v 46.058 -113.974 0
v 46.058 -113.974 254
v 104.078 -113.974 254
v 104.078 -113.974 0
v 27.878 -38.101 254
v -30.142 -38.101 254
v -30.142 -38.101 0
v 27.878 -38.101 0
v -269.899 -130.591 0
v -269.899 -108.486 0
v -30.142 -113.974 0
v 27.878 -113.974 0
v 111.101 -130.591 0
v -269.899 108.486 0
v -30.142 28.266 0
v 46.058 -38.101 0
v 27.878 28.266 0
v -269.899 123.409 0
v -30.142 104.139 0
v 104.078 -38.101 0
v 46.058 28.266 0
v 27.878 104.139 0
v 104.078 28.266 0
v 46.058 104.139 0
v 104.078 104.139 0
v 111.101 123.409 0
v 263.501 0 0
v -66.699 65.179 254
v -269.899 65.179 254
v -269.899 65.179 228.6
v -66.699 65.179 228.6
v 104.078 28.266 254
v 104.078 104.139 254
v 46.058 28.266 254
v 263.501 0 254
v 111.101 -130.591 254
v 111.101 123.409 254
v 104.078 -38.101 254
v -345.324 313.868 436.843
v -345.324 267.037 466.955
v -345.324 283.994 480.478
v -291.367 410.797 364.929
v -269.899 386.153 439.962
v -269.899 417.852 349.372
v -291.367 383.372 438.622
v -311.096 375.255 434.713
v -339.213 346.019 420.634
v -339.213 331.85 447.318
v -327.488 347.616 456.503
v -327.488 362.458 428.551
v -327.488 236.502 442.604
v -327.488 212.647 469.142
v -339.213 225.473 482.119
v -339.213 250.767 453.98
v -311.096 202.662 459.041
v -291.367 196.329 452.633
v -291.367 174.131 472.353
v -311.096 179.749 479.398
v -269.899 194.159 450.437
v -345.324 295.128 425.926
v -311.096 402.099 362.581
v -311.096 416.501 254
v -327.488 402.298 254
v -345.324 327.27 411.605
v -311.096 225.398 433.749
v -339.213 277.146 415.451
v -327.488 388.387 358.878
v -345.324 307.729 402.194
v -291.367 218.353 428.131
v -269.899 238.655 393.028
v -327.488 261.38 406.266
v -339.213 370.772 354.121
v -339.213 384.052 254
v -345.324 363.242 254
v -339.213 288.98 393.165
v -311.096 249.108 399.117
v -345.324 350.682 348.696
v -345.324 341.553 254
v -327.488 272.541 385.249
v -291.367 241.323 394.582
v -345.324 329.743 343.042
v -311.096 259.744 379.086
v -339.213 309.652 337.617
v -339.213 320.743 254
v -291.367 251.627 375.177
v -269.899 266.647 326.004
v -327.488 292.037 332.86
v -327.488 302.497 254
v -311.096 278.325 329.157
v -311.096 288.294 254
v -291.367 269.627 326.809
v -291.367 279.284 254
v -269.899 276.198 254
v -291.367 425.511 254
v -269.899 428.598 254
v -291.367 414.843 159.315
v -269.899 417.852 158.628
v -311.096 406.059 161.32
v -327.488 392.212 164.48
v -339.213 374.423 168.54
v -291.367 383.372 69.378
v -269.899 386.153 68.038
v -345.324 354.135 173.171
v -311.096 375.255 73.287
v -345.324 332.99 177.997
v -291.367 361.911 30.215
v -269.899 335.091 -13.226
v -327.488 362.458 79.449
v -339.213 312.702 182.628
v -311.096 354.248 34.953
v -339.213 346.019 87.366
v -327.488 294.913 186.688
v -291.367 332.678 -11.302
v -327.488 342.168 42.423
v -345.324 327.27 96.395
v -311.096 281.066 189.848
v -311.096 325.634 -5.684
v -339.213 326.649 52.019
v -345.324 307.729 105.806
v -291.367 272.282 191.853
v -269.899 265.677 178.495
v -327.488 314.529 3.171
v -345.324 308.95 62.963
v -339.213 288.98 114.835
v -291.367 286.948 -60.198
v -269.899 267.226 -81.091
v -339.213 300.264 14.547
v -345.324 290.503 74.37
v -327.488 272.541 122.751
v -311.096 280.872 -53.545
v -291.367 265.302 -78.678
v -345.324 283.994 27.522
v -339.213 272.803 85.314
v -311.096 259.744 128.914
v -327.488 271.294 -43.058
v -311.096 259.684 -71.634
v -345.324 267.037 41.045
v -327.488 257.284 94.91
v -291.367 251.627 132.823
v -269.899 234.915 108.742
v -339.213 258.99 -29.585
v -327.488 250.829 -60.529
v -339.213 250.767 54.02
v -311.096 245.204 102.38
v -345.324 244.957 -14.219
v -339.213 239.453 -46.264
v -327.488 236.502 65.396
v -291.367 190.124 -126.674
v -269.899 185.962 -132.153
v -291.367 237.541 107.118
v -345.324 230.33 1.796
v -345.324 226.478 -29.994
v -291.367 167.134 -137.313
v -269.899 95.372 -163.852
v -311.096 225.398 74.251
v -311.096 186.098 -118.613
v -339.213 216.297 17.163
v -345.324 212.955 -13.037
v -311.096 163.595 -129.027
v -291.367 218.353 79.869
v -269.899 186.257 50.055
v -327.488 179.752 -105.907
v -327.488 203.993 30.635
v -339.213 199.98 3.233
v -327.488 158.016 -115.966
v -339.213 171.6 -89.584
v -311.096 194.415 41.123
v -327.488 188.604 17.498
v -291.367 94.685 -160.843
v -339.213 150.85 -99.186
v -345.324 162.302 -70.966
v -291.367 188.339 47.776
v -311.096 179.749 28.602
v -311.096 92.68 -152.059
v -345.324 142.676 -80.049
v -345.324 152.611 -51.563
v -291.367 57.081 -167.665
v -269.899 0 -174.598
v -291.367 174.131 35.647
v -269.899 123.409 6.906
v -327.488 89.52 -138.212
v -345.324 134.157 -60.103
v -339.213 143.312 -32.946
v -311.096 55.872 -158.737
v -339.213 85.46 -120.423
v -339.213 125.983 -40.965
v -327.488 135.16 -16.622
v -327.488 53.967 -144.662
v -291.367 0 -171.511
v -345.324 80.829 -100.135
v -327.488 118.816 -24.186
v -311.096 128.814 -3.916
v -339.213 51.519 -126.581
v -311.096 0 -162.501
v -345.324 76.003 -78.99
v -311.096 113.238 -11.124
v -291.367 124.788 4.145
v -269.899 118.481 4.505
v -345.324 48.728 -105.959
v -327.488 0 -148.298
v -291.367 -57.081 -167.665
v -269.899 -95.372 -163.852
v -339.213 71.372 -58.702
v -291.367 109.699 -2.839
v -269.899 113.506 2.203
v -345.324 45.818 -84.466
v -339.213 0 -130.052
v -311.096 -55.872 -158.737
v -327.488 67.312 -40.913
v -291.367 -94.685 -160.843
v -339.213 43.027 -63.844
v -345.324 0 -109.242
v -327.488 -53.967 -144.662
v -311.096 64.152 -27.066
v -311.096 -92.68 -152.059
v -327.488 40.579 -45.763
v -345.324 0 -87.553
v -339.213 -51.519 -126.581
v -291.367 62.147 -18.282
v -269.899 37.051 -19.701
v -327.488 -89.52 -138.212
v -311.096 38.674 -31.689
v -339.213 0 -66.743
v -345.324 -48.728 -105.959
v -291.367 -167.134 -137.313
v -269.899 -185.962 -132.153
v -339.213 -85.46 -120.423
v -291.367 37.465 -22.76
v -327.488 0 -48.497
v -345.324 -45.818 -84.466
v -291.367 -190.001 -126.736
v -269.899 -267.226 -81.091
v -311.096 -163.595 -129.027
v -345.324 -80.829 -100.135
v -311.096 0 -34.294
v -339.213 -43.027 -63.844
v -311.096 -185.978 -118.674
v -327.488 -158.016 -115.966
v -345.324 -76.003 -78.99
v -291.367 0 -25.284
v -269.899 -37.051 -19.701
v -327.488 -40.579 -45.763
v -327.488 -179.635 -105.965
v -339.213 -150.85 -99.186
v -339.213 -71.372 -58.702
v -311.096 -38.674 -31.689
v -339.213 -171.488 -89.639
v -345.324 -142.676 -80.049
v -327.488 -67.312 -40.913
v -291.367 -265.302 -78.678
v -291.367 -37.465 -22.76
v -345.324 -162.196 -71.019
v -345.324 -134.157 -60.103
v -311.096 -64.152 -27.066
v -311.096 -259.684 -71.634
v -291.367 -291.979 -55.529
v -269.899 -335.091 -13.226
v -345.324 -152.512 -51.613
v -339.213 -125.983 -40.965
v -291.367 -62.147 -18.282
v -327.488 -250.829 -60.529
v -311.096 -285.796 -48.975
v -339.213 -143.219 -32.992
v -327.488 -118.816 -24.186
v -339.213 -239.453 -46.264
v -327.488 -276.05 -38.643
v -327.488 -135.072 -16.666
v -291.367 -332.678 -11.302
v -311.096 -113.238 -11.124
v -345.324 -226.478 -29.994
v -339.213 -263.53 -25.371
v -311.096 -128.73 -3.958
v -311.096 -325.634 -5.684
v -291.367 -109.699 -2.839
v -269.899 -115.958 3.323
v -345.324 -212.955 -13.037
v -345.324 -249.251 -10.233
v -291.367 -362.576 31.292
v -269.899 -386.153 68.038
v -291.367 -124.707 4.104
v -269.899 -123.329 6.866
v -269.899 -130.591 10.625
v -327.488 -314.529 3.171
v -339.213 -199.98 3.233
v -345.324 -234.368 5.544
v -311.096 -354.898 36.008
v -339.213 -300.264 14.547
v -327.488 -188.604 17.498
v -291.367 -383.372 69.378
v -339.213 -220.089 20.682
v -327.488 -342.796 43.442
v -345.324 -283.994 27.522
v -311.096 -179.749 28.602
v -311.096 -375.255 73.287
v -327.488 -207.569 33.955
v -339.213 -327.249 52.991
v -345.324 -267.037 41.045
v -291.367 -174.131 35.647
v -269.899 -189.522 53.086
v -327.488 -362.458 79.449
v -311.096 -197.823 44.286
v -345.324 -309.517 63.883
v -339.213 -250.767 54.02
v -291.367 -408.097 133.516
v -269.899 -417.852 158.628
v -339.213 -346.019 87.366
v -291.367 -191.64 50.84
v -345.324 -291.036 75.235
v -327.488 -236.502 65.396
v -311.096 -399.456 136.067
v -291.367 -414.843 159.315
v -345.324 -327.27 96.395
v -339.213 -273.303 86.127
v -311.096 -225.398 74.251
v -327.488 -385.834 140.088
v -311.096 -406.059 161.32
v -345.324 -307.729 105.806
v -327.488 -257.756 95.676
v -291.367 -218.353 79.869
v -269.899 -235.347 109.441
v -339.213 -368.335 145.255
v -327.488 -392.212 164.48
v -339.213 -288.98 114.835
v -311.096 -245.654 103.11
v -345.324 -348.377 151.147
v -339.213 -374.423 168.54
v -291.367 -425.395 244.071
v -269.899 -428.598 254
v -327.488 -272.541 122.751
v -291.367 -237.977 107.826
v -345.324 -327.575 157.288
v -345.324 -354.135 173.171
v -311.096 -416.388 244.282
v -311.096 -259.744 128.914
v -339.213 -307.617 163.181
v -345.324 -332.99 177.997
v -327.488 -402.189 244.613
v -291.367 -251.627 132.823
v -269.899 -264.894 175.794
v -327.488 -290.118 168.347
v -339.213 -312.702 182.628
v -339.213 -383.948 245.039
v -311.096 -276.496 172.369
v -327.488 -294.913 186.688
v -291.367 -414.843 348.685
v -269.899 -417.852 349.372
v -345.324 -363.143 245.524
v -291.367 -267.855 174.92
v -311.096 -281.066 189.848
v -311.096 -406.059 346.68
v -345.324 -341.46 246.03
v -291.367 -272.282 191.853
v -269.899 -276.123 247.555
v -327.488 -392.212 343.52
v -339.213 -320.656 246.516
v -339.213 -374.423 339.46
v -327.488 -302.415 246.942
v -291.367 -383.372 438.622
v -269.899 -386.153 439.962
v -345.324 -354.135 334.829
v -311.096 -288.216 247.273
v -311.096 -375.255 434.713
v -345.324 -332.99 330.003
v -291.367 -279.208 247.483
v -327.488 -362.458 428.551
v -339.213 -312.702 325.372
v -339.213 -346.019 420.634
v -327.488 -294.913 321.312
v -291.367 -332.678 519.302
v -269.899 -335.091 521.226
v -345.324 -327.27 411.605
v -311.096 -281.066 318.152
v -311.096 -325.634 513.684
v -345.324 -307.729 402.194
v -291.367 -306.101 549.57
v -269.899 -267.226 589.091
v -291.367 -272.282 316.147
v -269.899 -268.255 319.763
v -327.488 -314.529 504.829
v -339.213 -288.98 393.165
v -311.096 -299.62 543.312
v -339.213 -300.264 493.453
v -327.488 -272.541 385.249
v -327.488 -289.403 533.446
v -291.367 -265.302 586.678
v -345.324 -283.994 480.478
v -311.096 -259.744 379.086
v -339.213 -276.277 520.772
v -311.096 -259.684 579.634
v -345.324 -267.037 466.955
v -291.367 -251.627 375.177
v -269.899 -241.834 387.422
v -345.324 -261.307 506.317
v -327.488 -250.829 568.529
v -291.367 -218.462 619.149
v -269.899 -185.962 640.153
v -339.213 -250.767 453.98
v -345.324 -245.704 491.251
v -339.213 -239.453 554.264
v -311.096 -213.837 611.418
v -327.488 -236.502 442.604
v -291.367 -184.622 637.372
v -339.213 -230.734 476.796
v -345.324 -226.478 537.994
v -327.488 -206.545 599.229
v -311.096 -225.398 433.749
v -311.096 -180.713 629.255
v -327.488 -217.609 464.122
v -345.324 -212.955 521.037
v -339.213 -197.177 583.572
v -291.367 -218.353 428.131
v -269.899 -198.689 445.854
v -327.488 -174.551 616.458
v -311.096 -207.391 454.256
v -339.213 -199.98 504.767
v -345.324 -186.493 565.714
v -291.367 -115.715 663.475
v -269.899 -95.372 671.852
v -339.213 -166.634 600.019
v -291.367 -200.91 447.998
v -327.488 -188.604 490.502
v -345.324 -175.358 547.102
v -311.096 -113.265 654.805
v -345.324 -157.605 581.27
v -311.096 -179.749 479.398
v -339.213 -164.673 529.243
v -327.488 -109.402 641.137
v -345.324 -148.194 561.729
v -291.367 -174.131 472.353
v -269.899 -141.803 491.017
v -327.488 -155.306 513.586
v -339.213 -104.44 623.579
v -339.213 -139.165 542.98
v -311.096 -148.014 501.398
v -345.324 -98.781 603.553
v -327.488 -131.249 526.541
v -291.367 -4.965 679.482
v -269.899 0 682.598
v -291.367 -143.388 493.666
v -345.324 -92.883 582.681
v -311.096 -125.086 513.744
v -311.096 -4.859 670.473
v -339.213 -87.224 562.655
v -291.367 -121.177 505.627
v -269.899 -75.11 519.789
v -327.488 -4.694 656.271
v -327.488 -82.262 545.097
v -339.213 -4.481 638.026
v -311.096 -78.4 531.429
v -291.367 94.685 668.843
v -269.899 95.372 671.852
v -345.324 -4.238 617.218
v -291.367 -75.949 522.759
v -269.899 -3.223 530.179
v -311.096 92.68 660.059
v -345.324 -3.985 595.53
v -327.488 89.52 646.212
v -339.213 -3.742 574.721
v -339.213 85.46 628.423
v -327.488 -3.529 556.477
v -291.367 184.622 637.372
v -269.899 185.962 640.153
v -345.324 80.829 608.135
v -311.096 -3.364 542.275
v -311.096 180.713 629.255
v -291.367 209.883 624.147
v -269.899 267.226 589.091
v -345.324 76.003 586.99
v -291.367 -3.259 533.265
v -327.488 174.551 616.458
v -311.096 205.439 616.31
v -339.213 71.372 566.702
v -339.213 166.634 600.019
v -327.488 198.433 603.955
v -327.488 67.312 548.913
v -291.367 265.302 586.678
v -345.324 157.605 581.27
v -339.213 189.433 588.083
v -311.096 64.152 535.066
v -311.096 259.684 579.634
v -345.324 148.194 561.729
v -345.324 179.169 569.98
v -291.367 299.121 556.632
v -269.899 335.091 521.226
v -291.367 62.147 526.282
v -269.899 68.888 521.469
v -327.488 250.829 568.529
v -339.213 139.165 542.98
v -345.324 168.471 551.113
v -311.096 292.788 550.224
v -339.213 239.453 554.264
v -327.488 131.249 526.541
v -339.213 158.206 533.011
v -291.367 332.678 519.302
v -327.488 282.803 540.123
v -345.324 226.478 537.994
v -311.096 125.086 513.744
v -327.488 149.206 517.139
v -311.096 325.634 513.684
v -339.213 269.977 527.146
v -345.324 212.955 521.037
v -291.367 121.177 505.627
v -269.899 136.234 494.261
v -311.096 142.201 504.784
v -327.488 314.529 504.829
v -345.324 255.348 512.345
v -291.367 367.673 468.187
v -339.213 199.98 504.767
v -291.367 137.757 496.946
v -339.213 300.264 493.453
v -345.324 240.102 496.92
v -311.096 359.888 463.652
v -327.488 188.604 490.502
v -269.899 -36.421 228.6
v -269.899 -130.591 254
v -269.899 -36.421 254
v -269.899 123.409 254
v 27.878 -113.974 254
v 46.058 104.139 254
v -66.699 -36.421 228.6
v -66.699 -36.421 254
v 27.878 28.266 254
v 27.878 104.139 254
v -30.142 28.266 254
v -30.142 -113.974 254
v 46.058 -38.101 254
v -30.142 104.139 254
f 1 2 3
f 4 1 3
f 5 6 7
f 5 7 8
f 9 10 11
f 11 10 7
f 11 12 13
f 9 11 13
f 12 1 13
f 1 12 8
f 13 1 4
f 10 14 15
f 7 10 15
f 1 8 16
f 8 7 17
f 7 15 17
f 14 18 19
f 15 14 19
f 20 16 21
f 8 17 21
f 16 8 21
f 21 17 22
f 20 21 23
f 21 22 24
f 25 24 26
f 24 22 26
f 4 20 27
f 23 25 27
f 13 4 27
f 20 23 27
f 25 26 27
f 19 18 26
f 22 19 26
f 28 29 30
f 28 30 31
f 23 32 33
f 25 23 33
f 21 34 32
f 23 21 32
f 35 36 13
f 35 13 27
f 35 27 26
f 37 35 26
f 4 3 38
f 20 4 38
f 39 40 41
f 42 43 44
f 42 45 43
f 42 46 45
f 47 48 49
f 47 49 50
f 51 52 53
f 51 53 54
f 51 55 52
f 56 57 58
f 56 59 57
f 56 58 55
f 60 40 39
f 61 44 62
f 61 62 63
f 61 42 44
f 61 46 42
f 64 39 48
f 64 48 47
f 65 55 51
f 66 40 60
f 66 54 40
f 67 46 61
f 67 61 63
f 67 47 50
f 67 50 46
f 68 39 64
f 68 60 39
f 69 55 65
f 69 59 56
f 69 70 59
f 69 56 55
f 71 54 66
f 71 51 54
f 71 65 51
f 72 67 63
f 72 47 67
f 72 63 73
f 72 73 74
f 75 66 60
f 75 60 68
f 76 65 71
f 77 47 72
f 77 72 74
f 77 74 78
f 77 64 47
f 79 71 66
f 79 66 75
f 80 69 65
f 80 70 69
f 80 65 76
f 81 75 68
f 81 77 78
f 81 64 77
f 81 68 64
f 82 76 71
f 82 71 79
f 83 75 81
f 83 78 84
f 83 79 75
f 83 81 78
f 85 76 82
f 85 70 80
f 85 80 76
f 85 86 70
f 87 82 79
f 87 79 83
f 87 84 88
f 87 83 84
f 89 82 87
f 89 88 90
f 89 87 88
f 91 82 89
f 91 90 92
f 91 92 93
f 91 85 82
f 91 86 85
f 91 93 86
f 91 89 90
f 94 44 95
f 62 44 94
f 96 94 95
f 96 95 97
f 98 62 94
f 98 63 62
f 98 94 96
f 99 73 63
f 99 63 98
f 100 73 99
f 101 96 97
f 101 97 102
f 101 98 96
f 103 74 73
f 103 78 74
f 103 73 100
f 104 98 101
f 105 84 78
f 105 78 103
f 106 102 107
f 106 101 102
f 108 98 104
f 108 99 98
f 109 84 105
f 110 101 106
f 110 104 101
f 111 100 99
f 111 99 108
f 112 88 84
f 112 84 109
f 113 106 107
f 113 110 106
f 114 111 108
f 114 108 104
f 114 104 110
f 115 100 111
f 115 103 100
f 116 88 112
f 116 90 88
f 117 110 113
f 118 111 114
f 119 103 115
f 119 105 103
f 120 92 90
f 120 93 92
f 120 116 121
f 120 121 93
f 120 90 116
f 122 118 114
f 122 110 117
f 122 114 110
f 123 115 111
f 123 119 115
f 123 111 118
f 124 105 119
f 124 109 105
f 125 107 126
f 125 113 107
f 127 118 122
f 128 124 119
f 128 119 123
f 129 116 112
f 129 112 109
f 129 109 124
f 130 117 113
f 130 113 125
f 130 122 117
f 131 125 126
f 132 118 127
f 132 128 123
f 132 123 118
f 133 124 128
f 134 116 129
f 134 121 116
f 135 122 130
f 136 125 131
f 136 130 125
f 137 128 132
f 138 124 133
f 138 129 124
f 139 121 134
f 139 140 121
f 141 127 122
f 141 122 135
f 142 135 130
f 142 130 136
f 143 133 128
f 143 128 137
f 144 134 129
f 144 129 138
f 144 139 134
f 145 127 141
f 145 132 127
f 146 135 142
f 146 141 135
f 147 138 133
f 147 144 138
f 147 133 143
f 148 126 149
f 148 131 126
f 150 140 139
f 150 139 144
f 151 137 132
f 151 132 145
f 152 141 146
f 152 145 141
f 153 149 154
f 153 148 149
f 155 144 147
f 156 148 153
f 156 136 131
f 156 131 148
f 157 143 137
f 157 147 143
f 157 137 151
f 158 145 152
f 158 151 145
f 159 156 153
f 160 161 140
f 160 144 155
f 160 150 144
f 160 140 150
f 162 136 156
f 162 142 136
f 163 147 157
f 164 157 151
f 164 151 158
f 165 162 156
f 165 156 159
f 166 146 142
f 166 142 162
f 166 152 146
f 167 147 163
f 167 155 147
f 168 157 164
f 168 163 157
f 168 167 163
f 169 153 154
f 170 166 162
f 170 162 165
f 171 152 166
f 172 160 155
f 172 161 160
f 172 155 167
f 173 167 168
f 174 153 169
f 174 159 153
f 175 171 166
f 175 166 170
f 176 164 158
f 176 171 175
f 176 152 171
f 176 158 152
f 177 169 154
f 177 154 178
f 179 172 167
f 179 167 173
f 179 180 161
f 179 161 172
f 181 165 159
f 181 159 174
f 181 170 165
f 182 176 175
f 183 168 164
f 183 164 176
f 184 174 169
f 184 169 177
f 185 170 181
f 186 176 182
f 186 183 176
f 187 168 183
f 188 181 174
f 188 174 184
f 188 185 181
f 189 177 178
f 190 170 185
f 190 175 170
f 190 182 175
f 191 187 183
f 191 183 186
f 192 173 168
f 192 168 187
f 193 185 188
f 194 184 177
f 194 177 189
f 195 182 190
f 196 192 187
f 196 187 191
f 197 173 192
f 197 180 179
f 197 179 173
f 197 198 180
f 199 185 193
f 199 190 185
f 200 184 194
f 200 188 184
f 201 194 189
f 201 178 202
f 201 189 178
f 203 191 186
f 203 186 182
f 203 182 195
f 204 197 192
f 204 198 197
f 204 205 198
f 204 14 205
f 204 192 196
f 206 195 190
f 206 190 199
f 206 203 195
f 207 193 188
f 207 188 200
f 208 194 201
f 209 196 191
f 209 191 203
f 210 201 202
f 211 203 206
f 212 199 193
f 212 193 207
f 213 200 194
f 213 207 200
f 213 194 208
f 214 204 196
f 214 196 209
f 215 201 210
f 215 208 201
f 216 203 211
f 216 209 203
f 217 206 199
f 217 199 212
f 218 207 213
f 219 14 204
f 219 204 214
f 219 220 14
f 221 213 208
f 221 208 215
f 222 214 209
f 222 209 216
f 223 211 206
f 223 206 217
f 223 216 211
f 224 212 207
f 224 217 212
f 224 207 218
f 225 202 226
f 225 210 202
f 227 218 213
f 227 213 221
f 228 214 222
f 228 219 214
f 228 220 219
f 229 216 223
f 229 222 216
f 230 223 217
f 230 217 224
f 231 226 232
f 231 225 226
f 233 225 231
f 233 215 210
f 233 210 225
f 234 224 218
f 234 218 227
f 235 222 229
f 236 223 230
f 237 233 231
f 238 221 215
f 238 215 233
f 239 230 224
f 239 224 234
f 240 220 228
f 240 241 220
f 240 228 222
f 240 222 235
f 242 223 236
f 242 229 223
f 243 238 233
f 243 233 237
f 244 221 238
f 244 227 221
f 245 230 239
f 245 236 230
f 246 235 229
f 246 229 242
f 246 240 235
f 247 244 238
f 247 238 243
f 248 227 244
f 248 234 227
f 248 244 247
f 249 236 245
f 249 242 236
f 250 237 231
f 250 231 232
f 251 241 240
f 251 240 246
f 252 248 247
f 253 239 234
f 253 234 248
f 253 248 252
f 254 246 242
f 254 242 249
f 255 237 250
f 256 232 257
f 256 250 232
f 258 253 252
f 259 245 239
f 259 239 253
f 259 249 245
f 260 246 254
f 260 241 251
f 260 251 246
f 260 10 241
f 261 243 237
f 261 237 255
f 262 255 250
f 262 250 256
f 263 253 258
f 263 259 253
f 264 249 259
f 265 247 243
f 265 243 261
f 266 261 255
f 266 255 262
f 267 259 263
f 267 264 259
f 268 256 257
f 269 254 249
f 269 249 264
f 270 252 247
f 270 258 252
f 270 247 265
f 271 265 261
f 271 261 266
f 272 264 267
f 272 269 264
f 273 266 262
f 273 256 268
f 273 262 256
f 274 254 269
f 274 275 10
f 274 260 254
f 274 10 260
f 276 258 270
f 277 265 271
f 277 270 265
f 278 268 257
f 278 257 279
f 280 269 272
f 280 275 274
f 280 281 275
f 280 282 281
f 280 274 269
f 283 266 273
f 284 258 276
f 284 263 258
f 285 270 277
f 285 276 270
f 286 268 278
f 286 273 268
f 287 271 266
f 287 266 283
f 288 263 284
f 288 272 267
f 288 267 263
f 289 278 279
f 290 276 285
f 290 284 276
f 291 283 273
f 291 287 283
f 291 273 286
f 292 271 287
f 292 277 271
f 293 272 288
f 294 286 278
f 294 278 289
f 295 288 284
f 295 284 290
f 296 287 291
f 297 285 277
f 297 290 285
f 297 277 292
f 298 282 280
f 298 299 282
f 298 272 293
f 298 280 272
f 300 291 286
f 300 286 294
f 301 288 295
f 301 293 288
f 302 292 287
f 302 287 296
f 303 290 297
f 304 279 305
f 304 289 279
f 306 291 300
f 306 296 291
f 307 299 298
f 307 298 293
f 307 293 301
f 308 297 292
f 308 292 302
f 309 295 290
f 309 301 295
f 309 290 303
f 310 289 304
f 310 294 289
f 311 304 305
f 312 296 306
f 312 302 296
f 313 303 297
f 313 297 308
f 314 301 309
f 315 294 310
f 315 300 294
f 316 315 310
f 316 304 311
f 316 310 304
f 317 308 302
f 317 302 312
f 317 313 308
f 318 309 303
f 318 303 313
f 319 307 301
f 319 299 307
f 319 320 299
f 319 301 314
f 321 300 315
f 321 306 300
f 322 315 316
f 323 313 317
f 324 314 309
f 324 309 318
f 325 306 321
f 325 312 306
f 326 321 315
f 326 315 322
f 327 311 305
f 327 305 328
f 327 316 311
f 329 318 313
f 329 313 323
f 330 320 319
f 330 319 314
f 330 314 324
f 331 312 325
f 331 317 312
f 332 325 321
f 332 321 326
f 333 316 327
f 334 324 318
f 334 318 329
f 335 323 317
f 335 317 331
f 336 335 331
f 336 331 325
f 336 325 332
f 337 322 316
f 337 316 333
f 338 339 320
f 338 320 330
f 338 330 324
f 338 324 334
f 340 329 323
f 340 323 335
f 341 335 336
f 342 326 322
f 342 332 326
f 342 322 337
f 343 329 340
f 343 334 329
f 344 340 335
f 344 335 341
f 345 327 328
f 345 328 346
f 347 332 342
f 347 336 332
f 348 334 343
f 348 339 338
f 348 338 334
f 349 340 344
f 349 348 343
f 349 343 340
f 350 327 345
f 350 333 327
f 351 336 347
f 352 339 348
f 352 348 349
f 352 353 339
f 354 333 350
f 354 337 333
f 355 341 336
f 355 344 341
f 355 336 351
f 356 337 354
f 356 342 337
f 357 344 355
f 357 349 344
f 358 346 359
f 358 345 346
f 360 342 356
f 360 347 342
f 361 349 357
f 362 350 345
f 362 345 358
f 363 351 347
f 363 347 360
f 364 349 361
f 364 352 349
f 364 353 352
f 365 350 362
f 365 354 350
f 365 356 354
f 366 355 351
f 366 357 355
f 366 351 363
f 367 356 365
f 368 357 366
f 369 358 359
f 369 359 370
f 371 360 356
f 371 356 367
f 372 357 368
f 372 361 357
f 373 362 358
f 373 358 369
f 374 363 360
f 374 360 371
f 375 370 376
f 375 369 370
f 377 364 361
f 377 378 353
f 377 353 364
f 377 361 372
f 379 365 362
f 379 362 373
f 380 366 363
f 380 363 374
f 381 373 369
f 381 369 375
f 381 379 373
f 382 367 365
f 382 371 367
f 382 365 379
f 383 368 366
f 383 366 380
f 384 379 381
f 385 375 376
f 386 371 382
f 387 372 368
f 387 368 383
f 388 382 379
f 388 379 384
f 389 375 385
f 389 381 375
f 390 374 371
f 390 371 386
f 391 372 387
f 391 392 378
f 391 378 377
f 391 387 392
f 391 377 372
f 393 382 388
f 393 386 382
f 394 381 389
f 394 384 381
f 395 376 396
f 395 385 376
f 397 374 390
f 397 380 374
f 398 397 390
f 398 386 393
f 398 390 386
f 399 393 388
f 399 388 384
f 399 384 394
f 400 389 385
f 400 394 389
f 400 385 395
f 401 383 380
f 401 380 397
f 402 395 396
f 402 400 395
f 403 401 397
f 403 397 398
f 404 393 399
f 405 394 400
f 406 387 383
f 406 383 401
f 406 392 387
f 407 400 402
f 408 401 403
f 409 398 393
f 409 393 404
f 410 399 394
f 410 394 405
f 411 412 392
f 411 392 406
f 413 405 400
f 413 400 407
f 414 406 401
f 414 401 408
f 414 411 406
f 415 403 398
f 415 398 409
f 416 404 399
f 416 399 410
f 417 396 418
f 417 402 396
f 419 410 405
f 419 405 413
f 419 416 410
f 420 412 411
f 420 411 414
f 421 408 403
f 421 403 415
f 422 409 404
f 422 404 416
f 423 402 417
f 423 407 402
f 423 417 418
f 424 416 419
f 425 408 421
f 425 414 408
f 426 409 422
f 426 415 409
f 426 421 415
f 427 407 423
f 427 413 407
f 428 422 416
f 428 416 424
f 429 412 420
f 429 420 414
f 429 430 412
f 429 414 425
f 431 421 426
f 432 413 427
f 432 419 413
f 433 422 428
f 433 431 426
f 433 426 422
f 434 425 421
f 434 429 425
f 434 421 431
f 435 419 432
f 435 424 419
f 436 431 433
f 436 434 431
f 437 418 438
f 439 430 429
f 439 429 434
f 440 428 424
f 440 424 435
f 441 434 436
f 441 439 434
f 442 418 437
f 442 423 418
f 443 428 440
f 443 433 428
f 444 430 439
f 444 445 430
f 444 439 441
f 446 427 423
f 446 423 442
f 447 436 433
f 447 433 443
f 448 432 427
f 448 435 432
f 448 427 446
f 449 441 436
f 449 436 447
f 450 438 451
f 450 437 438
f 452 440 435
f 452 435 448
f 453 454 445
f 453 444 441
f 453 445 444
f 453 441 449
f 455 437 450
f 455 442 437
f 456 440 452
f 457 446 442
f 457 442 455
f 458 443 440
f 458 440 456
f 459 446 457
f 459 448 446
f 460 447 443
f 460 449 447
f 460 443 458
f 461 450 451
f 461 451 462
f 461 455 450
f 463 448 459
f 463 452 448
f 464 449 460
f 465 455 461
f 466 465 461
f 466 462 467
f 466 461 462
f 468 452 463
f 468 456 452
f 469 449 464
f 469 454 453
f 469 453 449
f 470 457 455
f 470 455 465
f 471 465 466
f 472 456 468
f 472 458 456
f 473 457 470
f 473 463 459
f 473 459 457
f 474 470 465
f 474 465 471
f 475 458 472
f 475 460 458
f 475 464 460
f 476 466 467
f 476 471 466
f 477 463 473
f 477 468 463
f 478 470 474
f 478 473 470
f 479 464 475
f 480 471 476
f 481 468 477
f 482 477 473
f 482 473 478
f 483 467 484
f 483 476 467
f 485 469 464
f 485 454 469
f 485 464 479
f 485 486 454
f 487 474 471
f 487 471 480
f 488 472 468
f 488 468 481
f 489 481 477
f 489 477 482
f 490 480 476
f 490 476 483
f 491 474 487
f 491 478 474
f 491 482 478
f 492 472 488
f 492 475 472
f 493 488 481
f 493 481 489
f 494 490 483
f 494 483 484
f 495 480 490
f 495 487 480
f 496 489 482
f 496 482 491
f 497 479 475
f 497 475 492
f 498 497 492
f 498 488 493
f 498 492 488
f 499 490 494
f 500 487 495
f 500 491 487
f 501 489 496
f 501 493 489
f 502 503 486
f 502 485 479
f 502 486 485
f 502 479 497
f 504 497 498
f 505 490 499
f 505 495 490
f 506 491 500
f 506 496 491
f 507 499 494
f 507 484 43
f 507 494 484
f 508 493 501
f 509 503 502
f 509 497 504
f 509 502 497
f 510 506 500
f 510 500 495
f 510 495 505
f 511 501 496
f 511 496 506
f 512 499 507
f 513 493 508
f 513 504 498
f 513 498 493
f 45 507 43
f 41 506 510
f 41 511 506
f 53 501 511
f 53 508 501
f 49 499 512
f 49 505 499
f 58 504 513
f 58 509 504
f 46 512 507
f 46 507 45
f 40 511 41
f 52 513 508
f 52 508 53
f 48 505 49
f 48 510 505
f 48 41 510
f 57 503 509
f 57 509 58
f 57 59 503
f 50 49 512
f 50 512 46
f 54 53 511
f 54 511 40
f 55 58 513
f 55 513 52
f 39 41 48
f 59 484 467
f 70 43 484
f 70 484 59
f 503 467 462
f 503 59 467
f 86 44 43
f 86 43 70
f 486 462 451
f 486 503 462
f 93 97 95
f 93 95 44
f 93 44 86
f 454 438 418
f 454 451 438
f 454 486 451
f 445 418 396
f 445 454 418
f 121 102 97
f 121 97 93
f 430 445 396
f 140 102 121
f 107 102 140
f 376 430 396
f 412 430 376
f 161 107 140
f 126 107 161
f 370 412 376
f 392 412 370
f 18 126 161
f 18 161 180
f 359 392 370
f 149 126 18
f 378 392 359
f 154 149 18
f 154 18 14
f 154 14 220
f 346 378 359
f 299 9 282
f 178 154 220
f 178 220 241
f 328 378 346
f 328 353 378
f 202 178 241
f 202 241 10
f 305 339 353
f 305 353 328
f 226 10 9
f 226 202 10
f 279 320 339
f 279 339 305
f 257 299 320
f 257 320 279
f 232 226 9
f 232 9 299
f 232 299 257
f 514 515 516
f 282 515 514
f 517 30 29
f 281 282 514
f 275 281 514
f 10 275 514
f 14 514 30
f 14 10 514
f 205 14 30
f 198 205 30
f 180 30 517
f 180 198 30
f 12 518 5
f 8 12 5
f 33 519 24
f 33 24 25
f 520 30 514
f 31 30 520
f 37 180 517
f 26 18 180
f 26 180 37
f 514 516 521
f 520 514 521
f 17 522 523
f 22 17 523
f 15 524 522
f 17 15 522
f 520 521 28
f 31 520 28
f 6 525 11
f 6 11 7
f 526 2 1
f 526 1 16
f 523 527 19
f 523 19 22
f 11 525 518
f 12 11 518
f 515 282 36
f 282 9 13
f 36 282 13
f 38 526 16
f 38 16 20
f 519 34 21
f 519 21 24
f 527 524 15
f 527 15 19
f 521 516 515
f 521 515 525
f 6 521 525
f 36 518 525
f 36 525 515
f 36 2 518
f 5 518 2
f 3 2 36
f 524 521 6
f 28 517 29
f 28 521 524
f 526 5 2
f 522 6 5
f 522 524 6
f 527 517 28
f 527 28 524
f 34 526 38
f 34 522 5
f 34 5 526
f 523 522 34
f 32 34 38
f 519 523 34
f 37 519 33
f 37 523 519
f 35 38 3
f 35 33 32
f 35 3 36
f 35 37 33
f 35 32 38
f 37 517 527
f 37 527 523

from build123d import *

# Parameters (mm, degrees)
F0_W     = 381
F0_H     = 254
F1_DEPTH = 254
F3_W     = 203.2
F3_H     = 101.6
F4_DEPTH = 25.4
F7_W     = 58.020108
F7_H     = 75.872456
F8_DEPTH = 254


with BuildPart() as f1:
    # F0 (on Top) → F1 (new body)
    with BuildSketch(Plane.XY):
        with Locations((-79.399429, -3.591057)):
            Rectangle(F0_W, F0_H)
        Polygon((263.500571, 0), (111.100571, 123.408943), (111.100571, -130.591057), align=None)
    extrude(amount=F1_DEPTH)

    # F3 (on face) → F4 (cut)
    with BuildSketch(Plane.XY.offset(254)):
        with Locations((-168.299429, 14.378742)):
            Rectangle(F3_W, F3_H)
    extrude(amount=-F4_DEPTH, mode=Mode.SUBTRACT)

    # F5 (on face) → F6 (revolve)
    with BuildSketch(Plane.XY.offset(254)):
        with BuildLine():
            Line((-269.899429, 276.197859), (-269.899429, 428.597859))
            ThreePointArc((-269.899429, 428.597859), (-346.099429, 352.397859), (-269.899429, 276.197859))
        make_face()
    revolve(axis=Axis((-3.199429, 0, 254), (-1, 0, 0)))

    # F7 (on face) → F8 (cut, through all)
    with BuildSketch(Plane.XY.offset(254)):
        with Locations((75.068335, 66.202429)):
            Rectangle(F7_W, F7_H)
        with Locations((-1.131665, 66.202429)):
            Rectangle(F7_W, F7_H)
        with Locations((-1.131665, -76.037571)):
            Rectangle(F7_W, F7_H)
        with Locations((75.068335, -76.037571)):
            Rectangle(F7_W, F7_H)
    extrude(amount=-F8_DEPTH, mode=Mode.SUBTRACT)


solid = f1.part
